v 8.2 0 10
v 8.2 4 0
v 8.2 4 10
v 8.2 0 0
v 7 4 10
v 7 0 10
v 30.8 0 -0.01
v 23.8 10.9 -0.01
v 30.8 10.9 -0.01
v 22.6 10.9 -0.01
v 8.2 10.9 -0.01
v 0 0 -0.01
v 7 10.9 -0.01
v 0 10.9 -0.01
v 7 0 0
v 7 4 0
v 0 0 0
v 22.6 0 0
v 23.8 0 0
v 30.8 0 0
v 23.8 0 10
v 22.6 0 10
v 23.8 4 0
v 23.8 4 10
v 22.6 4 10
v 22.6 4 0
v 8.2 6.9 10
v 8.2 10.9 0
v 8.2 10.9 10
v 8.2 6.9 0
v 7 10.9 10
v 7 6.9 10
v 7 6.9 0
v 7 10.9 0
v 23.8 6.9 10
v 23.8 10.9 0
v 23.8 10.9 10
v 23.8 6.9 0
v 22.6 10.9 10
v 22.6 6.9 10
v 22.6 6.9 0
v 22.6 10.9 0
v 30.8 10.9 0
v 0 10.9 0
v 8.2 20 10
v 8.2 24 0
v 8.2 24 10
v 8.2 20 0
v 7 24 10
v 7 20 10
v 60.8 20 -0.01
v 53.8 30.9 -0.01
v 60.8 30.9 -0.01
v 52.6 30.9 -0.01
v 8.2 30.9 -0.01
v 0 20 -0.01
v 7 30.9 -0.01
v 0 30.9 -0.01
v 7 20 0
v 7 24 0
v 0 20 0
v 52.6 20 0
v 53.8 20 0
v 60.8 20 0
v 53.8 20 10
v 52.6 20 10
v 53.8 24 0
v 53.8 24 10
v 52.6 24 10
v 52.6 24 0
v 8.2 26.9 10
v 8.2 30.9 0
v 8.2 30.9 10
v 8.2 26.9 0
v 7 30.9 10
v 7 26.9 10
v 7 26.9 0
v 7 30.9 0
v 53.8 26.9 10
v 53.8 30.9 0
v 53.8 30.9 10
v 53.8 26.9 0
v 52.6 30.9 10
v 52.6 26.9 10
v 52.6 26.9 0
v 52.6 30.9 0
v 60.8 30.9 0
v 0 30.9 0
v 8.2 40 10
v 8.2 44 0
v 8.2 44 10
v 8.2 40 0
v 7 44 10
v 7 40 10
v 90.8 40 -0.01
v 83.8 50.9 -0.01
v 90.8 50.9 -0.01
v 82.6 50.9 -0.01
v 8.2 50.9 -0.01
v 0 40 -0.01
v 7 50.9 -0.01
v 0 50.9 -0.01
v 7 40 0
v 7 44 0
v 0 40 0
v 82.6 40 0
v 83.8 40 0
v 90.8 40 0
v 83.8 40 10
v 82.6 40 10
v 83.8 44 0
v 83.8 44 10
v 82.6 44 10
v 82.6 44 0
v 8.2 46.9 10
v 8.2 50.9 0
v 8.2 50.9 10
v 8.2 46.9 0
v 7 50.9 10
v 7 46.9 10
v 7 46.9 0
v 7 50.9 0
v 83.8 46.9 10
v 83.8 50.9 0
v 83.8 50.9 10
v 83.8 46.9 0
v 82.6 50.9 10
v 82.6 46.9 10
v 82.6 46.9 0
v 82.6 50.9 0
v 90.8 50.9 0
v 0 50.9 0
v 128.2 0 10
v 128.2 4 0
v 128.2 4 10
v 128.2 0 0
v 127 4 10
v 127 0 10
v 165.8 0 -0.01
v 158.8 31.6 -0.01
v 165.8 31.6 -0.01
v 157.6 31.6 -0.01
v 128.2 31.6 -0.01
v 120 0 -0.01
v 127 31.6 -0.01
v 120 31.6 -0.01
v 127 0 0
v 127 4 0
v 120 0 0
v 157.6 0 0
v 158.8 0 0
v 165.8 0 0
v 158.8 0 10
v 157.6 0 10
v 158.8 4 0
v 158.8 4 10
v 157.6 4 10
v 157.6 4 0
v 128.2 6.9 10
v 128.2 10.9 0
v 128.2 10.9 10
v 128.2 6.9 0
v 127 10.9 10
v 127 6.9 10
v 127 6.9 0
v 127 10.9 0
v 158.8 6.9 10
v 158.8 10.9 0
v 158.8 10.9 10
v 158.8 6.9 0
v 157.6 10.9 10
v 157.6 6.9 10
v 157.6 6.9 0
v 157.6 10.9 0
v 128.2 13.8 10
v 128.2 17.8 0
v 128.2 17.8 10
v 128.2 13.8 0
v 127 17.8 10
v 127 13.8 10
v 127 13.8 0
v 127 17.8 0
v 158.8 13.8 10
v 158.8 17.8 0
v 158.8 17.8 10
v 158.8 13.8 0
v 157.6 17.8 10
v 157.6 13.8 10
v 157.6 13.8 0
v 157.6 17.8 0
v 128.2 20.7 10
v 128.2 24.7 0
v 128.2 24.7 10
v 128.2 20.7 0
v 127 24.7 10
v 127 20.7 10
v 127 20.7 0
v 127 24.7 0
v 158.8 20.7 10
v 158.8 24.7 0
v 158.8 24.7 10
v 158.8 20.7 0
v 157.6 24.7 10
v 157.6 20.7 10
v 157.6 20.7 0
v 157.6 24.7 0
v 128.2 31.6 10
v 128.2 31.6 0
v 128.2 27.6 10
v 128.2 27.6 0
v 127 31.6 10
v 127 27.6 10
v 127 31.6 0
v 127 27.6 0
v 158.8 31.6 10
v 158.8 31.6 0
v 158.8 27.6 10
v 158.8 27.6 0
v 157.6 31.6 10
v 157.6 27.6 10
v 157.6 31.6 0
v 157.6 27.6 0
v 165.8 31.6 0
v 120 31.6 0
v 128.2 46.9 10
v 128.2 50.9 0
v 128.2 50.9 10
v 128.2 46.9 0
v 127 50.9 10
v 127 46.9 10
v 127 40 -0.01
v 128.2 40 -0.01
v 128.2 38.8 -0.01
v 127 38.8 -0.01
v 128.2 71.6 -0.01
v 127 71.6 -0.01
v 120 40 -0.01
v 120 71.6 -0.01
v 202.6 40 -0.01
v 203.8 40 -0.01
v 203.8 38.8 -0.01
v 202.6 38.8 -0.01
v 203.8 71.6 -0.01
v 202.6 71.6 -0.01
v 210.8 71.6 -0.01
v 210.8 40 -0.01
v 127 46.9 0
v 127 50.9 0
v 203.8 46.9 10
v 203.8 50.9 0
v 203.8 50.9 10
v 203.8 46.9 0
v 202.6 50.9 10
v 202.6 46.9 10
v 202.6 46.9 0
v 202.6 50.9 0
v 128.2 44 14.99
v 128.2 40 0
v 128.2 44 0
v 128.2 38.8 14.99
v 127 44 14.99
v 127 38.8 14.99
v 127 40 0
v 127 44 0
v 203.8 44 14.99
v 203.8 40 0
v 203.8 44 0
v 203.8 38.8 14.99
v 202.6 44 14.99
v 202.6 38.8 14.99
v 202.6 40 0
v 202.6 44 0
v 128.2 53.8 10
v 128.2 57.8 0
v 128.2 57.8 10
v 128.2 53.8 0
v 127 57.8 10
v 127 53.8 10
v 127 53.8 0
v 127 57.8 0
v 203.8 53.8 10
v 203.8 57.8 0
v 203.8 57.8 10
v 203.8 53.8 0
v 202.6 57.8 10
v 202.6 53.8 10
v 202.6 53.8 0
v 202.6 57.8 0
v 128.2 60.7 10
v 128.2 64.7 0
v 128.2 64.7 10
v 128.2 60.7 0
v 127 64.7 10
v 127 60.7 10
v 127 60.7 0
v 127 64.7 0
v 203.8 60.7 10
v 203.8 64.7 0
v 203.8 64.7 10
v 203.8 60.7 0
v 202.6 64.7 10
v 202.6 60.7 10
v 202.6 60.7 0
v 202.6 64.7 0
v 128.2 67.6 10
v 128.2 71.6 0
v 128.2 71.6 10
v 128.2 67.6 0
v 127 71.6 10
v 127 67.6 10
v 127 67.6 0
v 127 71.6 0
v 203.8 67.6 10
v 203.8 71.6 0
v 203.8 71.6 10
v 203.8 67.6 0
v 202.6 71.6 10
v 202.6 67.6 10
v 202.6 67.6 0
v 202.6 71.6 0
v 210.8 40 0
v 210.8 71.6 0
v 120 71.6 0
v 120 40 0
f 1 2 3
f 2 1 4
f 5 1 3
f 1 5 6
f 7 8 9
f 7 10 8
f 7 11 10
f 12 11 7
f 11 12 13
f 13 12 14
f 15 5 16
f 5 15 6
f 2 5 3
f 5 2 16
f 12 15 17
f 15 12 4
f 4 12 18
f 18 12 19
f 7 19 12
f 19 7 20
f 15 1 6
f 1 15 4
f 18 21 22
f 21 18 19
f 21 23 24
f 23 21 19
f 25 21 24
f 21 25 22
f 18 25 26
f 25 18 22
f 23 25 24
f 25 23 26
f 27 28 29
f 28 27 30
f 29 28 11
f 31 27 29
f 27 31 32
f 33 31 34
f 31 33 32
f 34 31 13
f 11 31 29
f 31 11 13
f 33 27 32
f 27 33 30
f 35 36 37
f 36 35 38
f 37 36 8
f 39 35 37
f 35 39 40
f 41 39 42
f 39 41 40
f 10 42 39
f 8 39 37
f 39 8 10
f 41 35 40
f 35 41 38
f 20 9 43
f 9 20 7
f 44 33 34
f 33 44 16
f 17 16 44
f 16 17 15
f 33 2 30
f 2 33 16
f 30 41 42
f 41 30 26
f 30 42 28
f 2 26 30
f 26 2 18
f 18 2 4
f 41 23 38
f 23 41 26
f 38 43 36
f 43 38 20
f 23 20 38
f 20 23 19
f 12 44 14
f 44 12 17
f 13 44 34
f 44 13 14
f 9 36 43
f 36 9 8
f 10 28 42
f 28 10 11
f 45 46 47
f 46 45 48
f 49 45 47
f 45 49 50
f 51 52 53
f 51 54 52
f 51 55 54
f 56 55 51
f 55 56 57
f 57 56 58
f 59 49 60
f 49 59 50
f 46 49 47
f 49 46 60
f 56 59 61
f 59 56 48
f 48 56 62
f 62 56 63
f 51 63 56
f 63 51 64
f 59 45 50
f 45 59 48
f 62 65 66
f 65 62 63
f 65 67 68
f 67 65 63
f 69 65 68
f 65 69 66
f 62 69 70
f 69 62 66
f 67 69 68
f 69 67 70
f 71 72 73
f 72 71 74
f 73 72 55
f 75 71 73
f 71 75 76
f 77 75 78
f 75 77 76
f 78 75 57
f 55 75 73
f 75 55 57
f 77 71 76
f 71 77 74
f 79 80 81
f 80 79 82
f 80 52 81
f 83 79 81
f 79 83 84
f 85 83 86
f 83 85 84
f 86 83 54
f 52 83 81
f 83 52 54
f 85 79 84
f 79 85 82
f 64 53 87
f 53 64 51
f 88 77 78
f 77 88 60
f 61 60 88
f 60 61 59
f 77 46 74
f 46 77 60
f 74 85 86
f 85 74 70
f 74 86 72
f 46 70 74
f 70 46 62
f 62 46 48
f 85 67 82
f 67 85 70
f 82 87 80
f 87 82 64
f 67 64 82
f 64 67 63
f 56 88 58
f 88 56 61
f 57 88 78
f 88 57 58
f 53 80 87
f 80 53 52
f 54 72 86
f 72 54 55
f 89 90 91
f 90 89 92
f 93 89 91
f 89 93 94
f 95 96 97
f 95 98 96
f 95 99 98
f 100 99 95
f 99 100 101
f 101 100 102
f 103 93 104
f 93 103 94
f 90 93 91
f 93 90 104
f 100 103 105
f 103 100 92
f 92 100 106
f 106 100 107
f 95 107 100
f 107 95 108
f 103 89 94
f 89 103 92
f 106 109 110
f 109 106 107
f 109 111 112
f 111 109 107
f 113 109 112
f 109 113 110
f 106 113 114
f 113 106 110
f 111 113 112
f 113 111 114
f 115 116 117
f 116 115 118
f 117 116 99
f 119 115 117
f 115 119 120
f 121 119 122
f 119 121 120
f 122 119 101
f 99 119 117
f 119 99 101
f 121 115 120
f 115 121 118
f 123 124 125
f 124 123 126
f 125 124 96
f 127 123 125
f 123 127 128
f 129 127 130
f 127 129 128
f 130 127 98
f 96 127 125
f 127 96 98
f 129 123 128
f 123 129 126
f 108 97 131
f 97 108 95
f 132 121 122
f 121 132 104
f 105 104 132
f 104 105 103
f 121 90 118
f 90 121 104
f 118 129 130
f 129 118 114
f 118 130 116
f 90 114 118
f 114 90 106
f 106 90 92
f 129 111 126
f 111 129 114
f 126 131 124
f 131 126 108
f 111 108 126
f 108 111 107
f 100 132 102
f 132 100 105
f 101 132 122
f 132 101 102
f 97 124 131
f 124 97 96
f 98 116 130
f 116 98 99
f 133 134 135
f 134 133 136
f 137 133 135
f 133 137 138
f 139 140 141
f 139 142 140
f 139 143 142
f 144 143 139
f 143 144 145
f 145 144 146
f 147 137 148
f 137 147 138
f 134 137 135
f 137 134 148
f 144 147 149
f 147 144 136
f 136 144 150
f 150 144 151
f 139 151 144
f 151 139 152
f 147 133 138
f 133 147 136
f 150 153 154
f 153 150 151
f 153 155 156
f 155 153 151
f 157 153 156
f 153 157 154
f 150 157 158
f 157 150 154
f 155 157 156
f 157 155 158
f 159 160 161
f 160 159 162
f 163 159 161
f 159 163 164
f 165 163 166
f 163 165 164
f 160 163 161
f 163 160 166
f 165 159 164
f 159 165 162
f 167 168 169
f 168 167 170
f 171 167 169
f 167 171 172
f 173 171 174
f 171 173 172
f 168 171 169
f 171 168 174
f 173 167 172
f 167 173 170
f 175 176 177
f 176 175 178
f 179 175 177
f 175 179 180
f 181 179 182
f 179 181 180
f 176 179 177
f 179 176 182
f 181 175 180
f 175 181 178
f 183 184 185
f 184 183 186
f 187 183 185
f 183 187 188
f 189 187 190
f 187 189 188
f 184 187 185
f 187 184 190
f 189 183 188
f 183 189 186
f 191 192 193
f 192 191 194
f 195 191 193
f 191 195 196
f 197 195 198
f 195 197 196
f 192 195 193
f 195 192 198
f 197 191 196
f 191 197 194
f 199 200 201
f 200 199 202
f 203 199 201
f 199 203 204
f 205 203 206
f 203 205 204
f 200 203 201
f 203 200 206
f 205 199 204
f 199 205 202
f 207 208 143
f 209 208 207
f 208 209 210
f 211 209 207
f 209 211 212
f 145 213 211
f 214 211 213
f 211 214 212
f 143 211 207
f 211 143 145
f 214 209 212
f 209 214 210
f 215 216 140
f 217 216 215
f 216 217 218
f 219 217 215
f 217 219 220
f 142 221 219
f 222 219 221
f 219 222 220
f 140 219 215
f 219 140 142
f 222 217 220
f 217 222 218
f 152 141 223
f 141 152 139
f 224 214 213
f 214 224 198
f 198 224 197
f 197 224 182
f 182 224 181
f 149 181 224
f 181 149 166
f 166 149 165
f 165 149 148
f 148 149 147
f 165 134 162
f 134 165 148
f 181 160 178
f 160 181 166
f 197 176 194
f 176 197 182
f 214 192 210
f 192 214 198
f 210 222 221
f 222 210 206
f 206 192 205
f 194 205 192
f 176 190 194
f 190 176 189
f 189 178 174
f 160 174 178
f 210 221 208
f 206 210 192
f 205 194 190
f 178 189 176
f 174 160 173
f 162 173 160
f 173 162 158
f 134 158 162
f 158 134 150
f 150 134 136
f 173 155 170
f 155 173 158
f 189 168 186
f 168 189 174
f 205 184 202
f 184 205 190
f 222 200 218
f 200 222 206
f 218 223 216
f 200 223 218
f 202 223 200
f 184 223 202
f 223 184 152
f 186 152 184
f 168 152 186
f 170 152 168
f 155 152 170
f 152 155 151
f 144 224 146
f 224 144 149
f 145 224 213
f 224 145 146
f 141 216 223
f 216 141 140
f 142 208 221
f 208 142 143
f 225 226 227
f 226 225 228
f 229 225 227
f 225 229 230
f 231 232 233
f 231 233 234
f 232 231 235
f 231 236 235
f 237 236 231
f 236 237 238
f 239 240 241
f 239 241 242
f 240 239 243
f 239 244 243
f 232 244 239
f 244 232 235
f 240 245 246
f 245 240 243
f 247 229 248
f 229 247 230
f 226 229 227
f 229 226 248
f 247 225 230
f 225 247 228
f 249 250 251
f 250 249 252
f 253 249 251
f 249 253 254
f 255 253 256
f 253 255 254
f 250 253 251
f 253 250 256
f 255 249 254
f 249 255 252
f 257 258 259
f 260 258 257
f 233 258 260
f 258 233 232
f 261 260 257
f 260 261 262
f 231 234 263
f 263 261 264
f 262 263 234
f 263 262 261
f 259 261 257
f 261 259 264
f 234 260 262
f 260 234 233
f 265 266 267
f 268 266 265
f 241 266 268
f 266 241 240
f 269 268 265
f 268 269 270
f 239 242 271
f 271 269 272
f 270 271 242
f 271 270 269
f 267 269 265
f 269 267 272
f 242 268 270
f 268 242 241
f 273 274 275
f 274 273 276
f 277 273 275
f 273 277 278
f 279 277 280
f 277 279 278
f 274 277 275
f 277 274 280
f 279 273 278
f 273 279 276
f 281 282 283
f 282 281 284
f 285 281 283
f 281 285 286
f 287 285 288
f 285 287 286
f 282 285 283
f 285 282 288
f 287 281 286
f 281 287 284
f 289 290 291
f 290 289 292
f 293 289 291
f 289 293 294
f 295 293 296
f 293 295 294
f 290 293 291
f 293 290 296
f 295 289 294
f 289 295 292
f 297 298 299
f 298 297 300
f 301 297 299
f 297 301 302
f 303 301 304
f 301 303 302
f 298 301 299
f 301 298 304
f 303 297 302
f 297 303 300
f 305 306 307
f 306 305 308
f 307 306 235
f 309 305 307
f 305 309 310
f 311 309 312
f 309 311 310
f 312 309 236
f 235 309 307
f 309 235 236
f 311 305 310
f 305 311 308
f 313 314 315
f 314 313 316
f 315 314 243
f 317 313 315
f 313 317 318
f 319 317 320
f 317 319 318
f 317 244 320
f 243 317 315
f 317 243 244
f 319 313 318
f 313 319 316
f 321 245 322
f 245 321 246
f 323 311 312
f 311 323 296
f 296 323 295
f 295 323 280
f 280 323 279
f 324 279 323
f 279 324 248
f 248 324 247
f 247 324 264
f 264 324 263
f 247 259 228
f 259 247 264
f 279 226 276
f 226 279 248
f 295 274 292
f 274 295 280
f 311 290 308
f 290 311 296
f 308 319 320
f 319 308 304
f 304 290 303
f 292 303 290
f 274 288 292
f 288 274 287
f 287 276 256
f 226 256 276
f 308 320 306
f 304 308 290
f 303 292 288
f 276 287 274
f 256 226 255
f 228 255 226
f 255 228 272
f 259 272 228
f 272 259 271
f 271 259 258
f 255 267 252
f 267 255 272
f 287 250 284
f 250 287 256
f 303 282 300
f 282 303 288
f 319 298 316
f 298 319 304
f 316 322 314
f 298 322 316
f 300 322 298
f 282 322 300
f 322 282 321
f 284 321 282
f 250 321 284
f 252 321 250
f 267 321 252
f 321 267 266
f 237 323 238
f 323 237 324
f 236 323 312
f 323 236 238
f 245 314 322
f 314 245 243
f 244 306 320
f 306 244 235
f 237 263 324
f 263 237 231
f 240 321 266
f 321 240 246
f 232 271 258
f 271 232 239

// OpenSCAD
// file: ../../Base/Boxes.scad
// Fischertechnik Box Foundation
// Pre-designed Boxes

use <Constants.scad>

include <PlacementOptions.scad>

box190Width = 190;
box190Depth = 130;
box130Width = 130;
box130Depth = 95;
boxUsageHeight = 33.9;
boxWallThickness = 2.4;
boxBaseThickness = 1.0;
boxWebWidth = 3.0;

// getBoxWallThickness()
// Gets the wall thickness of a Fischertechnik Box

function getBoxWallThickness() = boxWallThickness;

// Gets the usable height of a fischertechnik box
function getBoxUsageHeight() = boxUsageHeight;

// Gets the thickness of the Fischertechnik box base.
function getBoxBaseThickness() = boxBaseThickness;

// Gets the width of a box web
function getBoxWebWidth() = boxWebWidth;

// Gets the usable inner space of a Box 190 as an x/y-list
function getBox190Space() = [
    box190Width - 2*getBoxWallThickness(), 
    box190Depth - 2*getBoxWallThickness() ];

// Imports the Fischertechnik empty box 130x190 mm and places it at position 0,0
// 190x130 are the outer sizes, the inner space is slightly smaller. Use getBox190Space() to get the inner sizes.
// This module needs the STL file "Fischertechnik Box 130x190.stl" in the library path.
// The box is positioned that the usable inner space is at the 0,0,0 position. The

module Box190() {
    translate([-getBoxWallThickness(),-getBoxWallThickness(),-getBoxBaseThickness()])
        import("Fischertechnik Box 130x190.stl", convexity=3);
}

// Gets the usable inner space of a Box 130 as an x/y-list
function getBox130Space() = [
    box130Width - 2*getBoxWallThickness(), 
    box130Depth - 2*getBoxWallThickness() ];

// Imports the Fischertechnik empty box 95x130 mm and places it at position 0,0
// 190x130 are the outer sizes, the inner space is slightly smaller. Use getBox190Space() to get the inner sizes.
// This module needs the STL file "Fischertechnik Box 95x130.stl" in the library path.
// The box is positioned that the usable inner space is at the 0,0,0 position. The

module Box130() {
    translate([-getBoxWallThickness(),-getBoxWallThickness(),-getBoxBaseThickness()])
        import("Fischertechnik Box 95x130.stl", convexity=3);
}

// Creates a web at the specified box walls
// corner 0 = LowerLeft, 1 = UpperLeft, 2 = UpperRight, 3 = LowerRight
// side 0 = LeftOfCorner, 1 = RightOfCorner
// distance = Distance in mm from the corner
// boxSpace = inner width and depth of the box (default: Box 190)
// webWidth = length of the web (default is 3 mms)
// webThickness = thickness of the web (default is 1 mm)

module BoxWeb(corner, side, distance, boxSpace=getBox190Space(), webWidth=getBoxWebWidth(), webThickness=1.0) {
    sink = getBoxWallThickness()/2;

    width = (corner % 2 == 0) ? 
            (side == LeftOfCorner ? webWidth : webThickness) :
            (side == LeftOfCorner ? webThickness : webWidth);

    depth = (corner % 2 == 0) ? 
            (side == RightOfCorner ? webWidth : webThickness) :
            (side == RightOfCorner ? webThickness : webWidth);
    
    xDiff = corner == LowerLeft ? 
                (side == LeftOfCorner ? -sink : distance) :
            (corner == UpperLeft ?                
                (side == LeftOfCorner ? distance : -sink) :
            (corner == UpperRight ?
                (side == LeftOfCorner ? boxSpace.x-webWidth+sink : boxSpace.x-distance-webThickness) :
                (side == LeftOfCorner ? boxSpace.x-distance-webThickness: boxSpace.x-webWidth+sink)));

    yDiff = corner == LowerLeft ? 
                (side == RightOfCorner ? -sink : distance) :
            (corner == UpperLeft ?
                (side == RightOfCorner ? boxSpace.y-distance : boxSpace.y-webWidth+sink) :
            (corner == UpperRight ?
                (side == RightOfCorner ? boxSpace.y-webWidth+sink : boxSpace.y-distance) :
                (side == RightOfCorner ? distance : -sink)));
    
    translate([xDiff, yDiff, -getExcess()])
        cube([width, depth, boxUsageHeight + 2*getExcess()]);
}
// file: ../../Base/Rotation.scad
// Fischertechnik Box Foundation
// Geometry Helpers Rotation

include <PlacementOptions.scad>

// getRotatedSpace(space, rotation=NoRotation)
// Rotates the space dependent on the specified rotation

function getRotatedSpace(space, rotation=NoRotation) = [
    (rotation == Rotate90 || rotation == Rotate270) ? space.y : space.x,
    (rotation == Rotate90 || rotation == Rotate270) ? space.x : space.y
];

// Rotates the given space around the fixed left lower corner
// space = the space the children needs as width/depth list [width,depth]
// rotation = 0 Rotate0 degrees, 1 Rotate90 degrees, 2 Rotate180 degrees, 3 Rotate270 degrees (equivalent to -90)

module RotateFix(space, rotation=Rotate0) {
    dy = (rotation == Rotate0 || rotation == Rotate270) ? 0 :
        (rotation == Rotate90) ? space.x :
        space.y;
    dx = (rotation < Rotate180) ? 0 :
        (rotation == Rotate180) ? space.x :
        space.y;
    
    translate([dx, dy, 0])
        rotate([0, 0, rotations[rotation]])
            children();
}
// file: ../../Base/Alignment.scad
// Fischertechnik Box Foundation
// Geometry Helpers Alignment

include <PlacementOptions.scad>

// getAlignedX(elementWidth, spaceWidth, align=AlignRight, offset=0)
// Gets the aligned X offset of an element with the given
// width in the given space.
// elementWidth = The width of the element to positon
// spaceWidth = The space where the element should be aligned
// align = 0 AlignLeft, 1 AlignCenter, 2 AlignRight
// offset = an optional offset from the aligned position. When
// aligned left or centered, then positive values are in X direction.
// When aligned right then positive values are in negative X direction.

function getAlignedX(elementWidth, spaceWidth, align=AlignRight, offset=0) =
    (align == AlignLeft) ?
        offset :
        ((align == AlignCenter) ?
        (spaceWidth - elementWidth)/2 + offset :
        spaceWidth - offset - elementWidth);

// getAlignedY(elementDepth, spaceDepth, align=AlignTop, offset=0)
// Gets the aligned Y offset of an element with the given
// depth in the given space.
// elementDepth = The depth of the element to positon
// spaceDepth = The space where the element should be aligned
// align = 0 AlignBottom, 1 AlignCenter, 2 AlignTop
// offset = an optional offset from the aligned position. When
// aligned bottom or centered, then positive values are in Y direction.
// When aligned top then positive values are in negative Y direction.

function getAlignedY(elementDepth, spaceDepth, align=AlignTop, offset=0) =
    (align == AlignBottom) ?
        offset :
        ((align == AlignCenter) ?
        (spaceDepth - elementDepth)/2 + offset :
        spaceDepth - offset - elementDepth);
// file: ../../Base/PlacementOptions.scad
// Fischertechnik Box Foundation
// Placement Options

// Alignment
NoAlign = 0;
AlignLeft = 1;
AlignBottom = 2;
AlignCenter = 3;
AlignRight = 4;
AlignTop = 5;

// Element rotation degree steps
rotations = [0, -90, -180, -270];

// Rotation
NoRotation = 0;
Rotate0 = 0;
Rotate90 = 1;
Rotate180 = 2;
Rotate270 = 3;

// Docking (seen from above)
NoDock = -1;
DockLeft = 0;
DockTop = 1;
DockRight = 2;
DockCorner = 2;
DockBottom = 3;

// Web corners
LowerLeft = 0;
UpperLeft = 1;
UpperRight = 2;
LowerRight = 3;

// Web position relative to corner
LeftOfCorner = 0;
RightOfCorner = 1;
// file: ../../Base/Placement.scad
// Fischertechnik Box Foundation
// Geometry Helpers Placement

use <Constants.scad>
use <Alignment.scad>
use <Rotation.scad>
use <Boxes.scad>

include <PlacementOptions.scad>

// Place(x=0, y=0, elementSpace=[0,0], alignX=AlignLeft, alignY=AlignBottom, rotation=Rotate0, boxSpace=getBox190Space())
// Places the child at the specified position
// y = Y-Position. This is a relative position when an X aligment is specified.
// x = X-Position. This is a relative position when an Y aligment is specified.
// elementSpace = space of the element to be placed [x,y]
// alignX = -1=NoAlign, 0 AlignLeft, 1 AlignCenter, 3 AlignRight (elementSpace and boxSpace required!)
// alignY = -1=NoAlign, 2 AlignBottom, 1 AlignCenter, 4 AlignTop (elementSpace and boxSpace required!)
// rotation = 0 Rotate0 0 degrees, 1 Rotate90 90 degrees, 
// 2 Rotate180 180 degrees, 3 Rotate270 270 degrees (equivalent to -90)
// boxSpace = Inner space of the box where the placement occurs [x,y] - default is Box 190x130 inner space

module Place(x=0, y=0, elementSpace=[0,0], 
  alignX=AlignLeft, alignY=AlignBottom, 
  rotation=NoRotation, boxSpace=getBox190Space()) {

    module Position(x, y, space, rotation=Rotate0) {
        translate([x, y, 0])
            RotateFix(space, rotation)
                children();
    }

    space = getRotatedSpace(elementSpace, rotation);
    alignedX = getAlignedX(space.x, boxSpace.x, alignX, x);
    alignedY = getAlignedY(space.y, boxSpace.y, alignY, y);
    Position(alignedX, alignedY, elementSpace, rotation)
        children();
}

// Center(space=getBox130Space(), elementSpace=[0,0])
// space = Space where the children is centered. For cylinder use centered=true and no elementSpace.
// elementSpace = space of the element to be centered [x,y]

module Center(space=getBox190Space(), elementSpace=[0,0]) {
    Place(elementSpace=elementSpace, boxSpace=space, alignX=AlignCenter, alignY=AlignCenter)
        children();
}

// CenterHorizontal(width=0, y=0, offset=0, space=getBox130Space())
// width = Width of the element to be placed.
// y = Y position of the element
// offset = Offset from the center position (negative will be left of the center)
// space = Space where the element is placed

module CenterHorizontal(width=0, y=0, offset=0, space=getBox190Space()) {
    Place(x=offset, y=y, elementSpace=[width, 0], boxSpace=space, alignX=AlignCenter)
        children(0);
}

// CenterVertical(depth=0, x=0, offset=0, space=getBox130Space())
// depth = Depth of the element to be placed.
// x = X position of the element
// offset = Offset from the center position (negative will be down of the center)
// space = Space where the element is placed

module CenterVertical(depth=0, x=0, offset=0, space=getBox190Space()) {
    Place(x=x, y=offset, elementSpace=[0, depth], boxSpace=space, alignY=AlignCenter)
        children(0);
}

// getIsVertical(align)
// True if the specified alignment needs a vertical orientation for a divider (AlignRight, AlignLeft)

function getIsVertical(align) = (align == AlignRight || align == AlignLeft);

// getIsHorizontal(align)
// True if the specified alignment needs a horizontal orientation for a divider (AlignTop, AlignBottom)

function getIsHorizontal(align) = (align == AlignTop || align == AlignBottom);
// file: ../../Base/Constants.scad
// Fischertechnik Box Foundation
// Constants

// Constant values necessary for multiple elements

// Base constants
dividerThickness = 1.2;
excess = 0.01;
fragments = 90;
tolerance = 0.8;

// Gets the thickness of a divider 
function getDividerThickness() = dividerThickness;

// Gets the excess that is used to merge walls into each other
function getExcess() = excess;

// Gets amount of fragments of a cylinder
function getFragments() = fragments;

// Gets the inner tolerance of a frame to each side
function getTolerance() = tolerance;


// Fischertechnik specific constants
axisDiameter = 4;
axisBottomDiameter = axisDiameter + 1;
standardEdgeDistance = 2.5;
standardWebDistance = 11.5;
standardCornerLength = 15;
tubeWallFactor = 0.8;
smallPartsFrameHeight = 20;

// Gets axis diameter
function getAxisDiameter() = axisDiameter;

// Gets axis bottom diameter for thicker part at the bottom
function getAxisBottomDiameter() = axisBottomDiameter;

// gets the standard distance to the wall of the box for dockable frames with webs
function getStandardEdgeDistance() = standardEdgeDistance;

// gets the standard distance of each web to the corner of the dockable frame
function getStandardWebDistance() = standardWebDistance;

// gets the standard length of the corner walls of a dockable frame
function getStandardCornerLength() = standardCornerLength;

// gets the wall thickness of a tube.
function getTubeWallThickness() = tubeWallFactor * getDividerThickness();

// gets the frame height for docked small parts boxes.
function getSmallPartsFrameHeight() = smallPartsFrameHeight;
// main file
// Fischertechnik Box Foundation
// ModelBase
// Test HolderBuildingPlate

use <../../Base/Constants.scad>
use <../../ModelBase/Complex.scad>

HolderBuildingPlate(30);

translate([0, 20, 0])
    HolderBuildingPlate(60);

translate([0, 40, 0])
    HolderBuildingPlate(90);

translate([120, 0, 0])
    HolderBuildingPlate(45, 4);

translate([120, 40, 0])
    HolderBuildingPlate(90, 4, dock=true);
